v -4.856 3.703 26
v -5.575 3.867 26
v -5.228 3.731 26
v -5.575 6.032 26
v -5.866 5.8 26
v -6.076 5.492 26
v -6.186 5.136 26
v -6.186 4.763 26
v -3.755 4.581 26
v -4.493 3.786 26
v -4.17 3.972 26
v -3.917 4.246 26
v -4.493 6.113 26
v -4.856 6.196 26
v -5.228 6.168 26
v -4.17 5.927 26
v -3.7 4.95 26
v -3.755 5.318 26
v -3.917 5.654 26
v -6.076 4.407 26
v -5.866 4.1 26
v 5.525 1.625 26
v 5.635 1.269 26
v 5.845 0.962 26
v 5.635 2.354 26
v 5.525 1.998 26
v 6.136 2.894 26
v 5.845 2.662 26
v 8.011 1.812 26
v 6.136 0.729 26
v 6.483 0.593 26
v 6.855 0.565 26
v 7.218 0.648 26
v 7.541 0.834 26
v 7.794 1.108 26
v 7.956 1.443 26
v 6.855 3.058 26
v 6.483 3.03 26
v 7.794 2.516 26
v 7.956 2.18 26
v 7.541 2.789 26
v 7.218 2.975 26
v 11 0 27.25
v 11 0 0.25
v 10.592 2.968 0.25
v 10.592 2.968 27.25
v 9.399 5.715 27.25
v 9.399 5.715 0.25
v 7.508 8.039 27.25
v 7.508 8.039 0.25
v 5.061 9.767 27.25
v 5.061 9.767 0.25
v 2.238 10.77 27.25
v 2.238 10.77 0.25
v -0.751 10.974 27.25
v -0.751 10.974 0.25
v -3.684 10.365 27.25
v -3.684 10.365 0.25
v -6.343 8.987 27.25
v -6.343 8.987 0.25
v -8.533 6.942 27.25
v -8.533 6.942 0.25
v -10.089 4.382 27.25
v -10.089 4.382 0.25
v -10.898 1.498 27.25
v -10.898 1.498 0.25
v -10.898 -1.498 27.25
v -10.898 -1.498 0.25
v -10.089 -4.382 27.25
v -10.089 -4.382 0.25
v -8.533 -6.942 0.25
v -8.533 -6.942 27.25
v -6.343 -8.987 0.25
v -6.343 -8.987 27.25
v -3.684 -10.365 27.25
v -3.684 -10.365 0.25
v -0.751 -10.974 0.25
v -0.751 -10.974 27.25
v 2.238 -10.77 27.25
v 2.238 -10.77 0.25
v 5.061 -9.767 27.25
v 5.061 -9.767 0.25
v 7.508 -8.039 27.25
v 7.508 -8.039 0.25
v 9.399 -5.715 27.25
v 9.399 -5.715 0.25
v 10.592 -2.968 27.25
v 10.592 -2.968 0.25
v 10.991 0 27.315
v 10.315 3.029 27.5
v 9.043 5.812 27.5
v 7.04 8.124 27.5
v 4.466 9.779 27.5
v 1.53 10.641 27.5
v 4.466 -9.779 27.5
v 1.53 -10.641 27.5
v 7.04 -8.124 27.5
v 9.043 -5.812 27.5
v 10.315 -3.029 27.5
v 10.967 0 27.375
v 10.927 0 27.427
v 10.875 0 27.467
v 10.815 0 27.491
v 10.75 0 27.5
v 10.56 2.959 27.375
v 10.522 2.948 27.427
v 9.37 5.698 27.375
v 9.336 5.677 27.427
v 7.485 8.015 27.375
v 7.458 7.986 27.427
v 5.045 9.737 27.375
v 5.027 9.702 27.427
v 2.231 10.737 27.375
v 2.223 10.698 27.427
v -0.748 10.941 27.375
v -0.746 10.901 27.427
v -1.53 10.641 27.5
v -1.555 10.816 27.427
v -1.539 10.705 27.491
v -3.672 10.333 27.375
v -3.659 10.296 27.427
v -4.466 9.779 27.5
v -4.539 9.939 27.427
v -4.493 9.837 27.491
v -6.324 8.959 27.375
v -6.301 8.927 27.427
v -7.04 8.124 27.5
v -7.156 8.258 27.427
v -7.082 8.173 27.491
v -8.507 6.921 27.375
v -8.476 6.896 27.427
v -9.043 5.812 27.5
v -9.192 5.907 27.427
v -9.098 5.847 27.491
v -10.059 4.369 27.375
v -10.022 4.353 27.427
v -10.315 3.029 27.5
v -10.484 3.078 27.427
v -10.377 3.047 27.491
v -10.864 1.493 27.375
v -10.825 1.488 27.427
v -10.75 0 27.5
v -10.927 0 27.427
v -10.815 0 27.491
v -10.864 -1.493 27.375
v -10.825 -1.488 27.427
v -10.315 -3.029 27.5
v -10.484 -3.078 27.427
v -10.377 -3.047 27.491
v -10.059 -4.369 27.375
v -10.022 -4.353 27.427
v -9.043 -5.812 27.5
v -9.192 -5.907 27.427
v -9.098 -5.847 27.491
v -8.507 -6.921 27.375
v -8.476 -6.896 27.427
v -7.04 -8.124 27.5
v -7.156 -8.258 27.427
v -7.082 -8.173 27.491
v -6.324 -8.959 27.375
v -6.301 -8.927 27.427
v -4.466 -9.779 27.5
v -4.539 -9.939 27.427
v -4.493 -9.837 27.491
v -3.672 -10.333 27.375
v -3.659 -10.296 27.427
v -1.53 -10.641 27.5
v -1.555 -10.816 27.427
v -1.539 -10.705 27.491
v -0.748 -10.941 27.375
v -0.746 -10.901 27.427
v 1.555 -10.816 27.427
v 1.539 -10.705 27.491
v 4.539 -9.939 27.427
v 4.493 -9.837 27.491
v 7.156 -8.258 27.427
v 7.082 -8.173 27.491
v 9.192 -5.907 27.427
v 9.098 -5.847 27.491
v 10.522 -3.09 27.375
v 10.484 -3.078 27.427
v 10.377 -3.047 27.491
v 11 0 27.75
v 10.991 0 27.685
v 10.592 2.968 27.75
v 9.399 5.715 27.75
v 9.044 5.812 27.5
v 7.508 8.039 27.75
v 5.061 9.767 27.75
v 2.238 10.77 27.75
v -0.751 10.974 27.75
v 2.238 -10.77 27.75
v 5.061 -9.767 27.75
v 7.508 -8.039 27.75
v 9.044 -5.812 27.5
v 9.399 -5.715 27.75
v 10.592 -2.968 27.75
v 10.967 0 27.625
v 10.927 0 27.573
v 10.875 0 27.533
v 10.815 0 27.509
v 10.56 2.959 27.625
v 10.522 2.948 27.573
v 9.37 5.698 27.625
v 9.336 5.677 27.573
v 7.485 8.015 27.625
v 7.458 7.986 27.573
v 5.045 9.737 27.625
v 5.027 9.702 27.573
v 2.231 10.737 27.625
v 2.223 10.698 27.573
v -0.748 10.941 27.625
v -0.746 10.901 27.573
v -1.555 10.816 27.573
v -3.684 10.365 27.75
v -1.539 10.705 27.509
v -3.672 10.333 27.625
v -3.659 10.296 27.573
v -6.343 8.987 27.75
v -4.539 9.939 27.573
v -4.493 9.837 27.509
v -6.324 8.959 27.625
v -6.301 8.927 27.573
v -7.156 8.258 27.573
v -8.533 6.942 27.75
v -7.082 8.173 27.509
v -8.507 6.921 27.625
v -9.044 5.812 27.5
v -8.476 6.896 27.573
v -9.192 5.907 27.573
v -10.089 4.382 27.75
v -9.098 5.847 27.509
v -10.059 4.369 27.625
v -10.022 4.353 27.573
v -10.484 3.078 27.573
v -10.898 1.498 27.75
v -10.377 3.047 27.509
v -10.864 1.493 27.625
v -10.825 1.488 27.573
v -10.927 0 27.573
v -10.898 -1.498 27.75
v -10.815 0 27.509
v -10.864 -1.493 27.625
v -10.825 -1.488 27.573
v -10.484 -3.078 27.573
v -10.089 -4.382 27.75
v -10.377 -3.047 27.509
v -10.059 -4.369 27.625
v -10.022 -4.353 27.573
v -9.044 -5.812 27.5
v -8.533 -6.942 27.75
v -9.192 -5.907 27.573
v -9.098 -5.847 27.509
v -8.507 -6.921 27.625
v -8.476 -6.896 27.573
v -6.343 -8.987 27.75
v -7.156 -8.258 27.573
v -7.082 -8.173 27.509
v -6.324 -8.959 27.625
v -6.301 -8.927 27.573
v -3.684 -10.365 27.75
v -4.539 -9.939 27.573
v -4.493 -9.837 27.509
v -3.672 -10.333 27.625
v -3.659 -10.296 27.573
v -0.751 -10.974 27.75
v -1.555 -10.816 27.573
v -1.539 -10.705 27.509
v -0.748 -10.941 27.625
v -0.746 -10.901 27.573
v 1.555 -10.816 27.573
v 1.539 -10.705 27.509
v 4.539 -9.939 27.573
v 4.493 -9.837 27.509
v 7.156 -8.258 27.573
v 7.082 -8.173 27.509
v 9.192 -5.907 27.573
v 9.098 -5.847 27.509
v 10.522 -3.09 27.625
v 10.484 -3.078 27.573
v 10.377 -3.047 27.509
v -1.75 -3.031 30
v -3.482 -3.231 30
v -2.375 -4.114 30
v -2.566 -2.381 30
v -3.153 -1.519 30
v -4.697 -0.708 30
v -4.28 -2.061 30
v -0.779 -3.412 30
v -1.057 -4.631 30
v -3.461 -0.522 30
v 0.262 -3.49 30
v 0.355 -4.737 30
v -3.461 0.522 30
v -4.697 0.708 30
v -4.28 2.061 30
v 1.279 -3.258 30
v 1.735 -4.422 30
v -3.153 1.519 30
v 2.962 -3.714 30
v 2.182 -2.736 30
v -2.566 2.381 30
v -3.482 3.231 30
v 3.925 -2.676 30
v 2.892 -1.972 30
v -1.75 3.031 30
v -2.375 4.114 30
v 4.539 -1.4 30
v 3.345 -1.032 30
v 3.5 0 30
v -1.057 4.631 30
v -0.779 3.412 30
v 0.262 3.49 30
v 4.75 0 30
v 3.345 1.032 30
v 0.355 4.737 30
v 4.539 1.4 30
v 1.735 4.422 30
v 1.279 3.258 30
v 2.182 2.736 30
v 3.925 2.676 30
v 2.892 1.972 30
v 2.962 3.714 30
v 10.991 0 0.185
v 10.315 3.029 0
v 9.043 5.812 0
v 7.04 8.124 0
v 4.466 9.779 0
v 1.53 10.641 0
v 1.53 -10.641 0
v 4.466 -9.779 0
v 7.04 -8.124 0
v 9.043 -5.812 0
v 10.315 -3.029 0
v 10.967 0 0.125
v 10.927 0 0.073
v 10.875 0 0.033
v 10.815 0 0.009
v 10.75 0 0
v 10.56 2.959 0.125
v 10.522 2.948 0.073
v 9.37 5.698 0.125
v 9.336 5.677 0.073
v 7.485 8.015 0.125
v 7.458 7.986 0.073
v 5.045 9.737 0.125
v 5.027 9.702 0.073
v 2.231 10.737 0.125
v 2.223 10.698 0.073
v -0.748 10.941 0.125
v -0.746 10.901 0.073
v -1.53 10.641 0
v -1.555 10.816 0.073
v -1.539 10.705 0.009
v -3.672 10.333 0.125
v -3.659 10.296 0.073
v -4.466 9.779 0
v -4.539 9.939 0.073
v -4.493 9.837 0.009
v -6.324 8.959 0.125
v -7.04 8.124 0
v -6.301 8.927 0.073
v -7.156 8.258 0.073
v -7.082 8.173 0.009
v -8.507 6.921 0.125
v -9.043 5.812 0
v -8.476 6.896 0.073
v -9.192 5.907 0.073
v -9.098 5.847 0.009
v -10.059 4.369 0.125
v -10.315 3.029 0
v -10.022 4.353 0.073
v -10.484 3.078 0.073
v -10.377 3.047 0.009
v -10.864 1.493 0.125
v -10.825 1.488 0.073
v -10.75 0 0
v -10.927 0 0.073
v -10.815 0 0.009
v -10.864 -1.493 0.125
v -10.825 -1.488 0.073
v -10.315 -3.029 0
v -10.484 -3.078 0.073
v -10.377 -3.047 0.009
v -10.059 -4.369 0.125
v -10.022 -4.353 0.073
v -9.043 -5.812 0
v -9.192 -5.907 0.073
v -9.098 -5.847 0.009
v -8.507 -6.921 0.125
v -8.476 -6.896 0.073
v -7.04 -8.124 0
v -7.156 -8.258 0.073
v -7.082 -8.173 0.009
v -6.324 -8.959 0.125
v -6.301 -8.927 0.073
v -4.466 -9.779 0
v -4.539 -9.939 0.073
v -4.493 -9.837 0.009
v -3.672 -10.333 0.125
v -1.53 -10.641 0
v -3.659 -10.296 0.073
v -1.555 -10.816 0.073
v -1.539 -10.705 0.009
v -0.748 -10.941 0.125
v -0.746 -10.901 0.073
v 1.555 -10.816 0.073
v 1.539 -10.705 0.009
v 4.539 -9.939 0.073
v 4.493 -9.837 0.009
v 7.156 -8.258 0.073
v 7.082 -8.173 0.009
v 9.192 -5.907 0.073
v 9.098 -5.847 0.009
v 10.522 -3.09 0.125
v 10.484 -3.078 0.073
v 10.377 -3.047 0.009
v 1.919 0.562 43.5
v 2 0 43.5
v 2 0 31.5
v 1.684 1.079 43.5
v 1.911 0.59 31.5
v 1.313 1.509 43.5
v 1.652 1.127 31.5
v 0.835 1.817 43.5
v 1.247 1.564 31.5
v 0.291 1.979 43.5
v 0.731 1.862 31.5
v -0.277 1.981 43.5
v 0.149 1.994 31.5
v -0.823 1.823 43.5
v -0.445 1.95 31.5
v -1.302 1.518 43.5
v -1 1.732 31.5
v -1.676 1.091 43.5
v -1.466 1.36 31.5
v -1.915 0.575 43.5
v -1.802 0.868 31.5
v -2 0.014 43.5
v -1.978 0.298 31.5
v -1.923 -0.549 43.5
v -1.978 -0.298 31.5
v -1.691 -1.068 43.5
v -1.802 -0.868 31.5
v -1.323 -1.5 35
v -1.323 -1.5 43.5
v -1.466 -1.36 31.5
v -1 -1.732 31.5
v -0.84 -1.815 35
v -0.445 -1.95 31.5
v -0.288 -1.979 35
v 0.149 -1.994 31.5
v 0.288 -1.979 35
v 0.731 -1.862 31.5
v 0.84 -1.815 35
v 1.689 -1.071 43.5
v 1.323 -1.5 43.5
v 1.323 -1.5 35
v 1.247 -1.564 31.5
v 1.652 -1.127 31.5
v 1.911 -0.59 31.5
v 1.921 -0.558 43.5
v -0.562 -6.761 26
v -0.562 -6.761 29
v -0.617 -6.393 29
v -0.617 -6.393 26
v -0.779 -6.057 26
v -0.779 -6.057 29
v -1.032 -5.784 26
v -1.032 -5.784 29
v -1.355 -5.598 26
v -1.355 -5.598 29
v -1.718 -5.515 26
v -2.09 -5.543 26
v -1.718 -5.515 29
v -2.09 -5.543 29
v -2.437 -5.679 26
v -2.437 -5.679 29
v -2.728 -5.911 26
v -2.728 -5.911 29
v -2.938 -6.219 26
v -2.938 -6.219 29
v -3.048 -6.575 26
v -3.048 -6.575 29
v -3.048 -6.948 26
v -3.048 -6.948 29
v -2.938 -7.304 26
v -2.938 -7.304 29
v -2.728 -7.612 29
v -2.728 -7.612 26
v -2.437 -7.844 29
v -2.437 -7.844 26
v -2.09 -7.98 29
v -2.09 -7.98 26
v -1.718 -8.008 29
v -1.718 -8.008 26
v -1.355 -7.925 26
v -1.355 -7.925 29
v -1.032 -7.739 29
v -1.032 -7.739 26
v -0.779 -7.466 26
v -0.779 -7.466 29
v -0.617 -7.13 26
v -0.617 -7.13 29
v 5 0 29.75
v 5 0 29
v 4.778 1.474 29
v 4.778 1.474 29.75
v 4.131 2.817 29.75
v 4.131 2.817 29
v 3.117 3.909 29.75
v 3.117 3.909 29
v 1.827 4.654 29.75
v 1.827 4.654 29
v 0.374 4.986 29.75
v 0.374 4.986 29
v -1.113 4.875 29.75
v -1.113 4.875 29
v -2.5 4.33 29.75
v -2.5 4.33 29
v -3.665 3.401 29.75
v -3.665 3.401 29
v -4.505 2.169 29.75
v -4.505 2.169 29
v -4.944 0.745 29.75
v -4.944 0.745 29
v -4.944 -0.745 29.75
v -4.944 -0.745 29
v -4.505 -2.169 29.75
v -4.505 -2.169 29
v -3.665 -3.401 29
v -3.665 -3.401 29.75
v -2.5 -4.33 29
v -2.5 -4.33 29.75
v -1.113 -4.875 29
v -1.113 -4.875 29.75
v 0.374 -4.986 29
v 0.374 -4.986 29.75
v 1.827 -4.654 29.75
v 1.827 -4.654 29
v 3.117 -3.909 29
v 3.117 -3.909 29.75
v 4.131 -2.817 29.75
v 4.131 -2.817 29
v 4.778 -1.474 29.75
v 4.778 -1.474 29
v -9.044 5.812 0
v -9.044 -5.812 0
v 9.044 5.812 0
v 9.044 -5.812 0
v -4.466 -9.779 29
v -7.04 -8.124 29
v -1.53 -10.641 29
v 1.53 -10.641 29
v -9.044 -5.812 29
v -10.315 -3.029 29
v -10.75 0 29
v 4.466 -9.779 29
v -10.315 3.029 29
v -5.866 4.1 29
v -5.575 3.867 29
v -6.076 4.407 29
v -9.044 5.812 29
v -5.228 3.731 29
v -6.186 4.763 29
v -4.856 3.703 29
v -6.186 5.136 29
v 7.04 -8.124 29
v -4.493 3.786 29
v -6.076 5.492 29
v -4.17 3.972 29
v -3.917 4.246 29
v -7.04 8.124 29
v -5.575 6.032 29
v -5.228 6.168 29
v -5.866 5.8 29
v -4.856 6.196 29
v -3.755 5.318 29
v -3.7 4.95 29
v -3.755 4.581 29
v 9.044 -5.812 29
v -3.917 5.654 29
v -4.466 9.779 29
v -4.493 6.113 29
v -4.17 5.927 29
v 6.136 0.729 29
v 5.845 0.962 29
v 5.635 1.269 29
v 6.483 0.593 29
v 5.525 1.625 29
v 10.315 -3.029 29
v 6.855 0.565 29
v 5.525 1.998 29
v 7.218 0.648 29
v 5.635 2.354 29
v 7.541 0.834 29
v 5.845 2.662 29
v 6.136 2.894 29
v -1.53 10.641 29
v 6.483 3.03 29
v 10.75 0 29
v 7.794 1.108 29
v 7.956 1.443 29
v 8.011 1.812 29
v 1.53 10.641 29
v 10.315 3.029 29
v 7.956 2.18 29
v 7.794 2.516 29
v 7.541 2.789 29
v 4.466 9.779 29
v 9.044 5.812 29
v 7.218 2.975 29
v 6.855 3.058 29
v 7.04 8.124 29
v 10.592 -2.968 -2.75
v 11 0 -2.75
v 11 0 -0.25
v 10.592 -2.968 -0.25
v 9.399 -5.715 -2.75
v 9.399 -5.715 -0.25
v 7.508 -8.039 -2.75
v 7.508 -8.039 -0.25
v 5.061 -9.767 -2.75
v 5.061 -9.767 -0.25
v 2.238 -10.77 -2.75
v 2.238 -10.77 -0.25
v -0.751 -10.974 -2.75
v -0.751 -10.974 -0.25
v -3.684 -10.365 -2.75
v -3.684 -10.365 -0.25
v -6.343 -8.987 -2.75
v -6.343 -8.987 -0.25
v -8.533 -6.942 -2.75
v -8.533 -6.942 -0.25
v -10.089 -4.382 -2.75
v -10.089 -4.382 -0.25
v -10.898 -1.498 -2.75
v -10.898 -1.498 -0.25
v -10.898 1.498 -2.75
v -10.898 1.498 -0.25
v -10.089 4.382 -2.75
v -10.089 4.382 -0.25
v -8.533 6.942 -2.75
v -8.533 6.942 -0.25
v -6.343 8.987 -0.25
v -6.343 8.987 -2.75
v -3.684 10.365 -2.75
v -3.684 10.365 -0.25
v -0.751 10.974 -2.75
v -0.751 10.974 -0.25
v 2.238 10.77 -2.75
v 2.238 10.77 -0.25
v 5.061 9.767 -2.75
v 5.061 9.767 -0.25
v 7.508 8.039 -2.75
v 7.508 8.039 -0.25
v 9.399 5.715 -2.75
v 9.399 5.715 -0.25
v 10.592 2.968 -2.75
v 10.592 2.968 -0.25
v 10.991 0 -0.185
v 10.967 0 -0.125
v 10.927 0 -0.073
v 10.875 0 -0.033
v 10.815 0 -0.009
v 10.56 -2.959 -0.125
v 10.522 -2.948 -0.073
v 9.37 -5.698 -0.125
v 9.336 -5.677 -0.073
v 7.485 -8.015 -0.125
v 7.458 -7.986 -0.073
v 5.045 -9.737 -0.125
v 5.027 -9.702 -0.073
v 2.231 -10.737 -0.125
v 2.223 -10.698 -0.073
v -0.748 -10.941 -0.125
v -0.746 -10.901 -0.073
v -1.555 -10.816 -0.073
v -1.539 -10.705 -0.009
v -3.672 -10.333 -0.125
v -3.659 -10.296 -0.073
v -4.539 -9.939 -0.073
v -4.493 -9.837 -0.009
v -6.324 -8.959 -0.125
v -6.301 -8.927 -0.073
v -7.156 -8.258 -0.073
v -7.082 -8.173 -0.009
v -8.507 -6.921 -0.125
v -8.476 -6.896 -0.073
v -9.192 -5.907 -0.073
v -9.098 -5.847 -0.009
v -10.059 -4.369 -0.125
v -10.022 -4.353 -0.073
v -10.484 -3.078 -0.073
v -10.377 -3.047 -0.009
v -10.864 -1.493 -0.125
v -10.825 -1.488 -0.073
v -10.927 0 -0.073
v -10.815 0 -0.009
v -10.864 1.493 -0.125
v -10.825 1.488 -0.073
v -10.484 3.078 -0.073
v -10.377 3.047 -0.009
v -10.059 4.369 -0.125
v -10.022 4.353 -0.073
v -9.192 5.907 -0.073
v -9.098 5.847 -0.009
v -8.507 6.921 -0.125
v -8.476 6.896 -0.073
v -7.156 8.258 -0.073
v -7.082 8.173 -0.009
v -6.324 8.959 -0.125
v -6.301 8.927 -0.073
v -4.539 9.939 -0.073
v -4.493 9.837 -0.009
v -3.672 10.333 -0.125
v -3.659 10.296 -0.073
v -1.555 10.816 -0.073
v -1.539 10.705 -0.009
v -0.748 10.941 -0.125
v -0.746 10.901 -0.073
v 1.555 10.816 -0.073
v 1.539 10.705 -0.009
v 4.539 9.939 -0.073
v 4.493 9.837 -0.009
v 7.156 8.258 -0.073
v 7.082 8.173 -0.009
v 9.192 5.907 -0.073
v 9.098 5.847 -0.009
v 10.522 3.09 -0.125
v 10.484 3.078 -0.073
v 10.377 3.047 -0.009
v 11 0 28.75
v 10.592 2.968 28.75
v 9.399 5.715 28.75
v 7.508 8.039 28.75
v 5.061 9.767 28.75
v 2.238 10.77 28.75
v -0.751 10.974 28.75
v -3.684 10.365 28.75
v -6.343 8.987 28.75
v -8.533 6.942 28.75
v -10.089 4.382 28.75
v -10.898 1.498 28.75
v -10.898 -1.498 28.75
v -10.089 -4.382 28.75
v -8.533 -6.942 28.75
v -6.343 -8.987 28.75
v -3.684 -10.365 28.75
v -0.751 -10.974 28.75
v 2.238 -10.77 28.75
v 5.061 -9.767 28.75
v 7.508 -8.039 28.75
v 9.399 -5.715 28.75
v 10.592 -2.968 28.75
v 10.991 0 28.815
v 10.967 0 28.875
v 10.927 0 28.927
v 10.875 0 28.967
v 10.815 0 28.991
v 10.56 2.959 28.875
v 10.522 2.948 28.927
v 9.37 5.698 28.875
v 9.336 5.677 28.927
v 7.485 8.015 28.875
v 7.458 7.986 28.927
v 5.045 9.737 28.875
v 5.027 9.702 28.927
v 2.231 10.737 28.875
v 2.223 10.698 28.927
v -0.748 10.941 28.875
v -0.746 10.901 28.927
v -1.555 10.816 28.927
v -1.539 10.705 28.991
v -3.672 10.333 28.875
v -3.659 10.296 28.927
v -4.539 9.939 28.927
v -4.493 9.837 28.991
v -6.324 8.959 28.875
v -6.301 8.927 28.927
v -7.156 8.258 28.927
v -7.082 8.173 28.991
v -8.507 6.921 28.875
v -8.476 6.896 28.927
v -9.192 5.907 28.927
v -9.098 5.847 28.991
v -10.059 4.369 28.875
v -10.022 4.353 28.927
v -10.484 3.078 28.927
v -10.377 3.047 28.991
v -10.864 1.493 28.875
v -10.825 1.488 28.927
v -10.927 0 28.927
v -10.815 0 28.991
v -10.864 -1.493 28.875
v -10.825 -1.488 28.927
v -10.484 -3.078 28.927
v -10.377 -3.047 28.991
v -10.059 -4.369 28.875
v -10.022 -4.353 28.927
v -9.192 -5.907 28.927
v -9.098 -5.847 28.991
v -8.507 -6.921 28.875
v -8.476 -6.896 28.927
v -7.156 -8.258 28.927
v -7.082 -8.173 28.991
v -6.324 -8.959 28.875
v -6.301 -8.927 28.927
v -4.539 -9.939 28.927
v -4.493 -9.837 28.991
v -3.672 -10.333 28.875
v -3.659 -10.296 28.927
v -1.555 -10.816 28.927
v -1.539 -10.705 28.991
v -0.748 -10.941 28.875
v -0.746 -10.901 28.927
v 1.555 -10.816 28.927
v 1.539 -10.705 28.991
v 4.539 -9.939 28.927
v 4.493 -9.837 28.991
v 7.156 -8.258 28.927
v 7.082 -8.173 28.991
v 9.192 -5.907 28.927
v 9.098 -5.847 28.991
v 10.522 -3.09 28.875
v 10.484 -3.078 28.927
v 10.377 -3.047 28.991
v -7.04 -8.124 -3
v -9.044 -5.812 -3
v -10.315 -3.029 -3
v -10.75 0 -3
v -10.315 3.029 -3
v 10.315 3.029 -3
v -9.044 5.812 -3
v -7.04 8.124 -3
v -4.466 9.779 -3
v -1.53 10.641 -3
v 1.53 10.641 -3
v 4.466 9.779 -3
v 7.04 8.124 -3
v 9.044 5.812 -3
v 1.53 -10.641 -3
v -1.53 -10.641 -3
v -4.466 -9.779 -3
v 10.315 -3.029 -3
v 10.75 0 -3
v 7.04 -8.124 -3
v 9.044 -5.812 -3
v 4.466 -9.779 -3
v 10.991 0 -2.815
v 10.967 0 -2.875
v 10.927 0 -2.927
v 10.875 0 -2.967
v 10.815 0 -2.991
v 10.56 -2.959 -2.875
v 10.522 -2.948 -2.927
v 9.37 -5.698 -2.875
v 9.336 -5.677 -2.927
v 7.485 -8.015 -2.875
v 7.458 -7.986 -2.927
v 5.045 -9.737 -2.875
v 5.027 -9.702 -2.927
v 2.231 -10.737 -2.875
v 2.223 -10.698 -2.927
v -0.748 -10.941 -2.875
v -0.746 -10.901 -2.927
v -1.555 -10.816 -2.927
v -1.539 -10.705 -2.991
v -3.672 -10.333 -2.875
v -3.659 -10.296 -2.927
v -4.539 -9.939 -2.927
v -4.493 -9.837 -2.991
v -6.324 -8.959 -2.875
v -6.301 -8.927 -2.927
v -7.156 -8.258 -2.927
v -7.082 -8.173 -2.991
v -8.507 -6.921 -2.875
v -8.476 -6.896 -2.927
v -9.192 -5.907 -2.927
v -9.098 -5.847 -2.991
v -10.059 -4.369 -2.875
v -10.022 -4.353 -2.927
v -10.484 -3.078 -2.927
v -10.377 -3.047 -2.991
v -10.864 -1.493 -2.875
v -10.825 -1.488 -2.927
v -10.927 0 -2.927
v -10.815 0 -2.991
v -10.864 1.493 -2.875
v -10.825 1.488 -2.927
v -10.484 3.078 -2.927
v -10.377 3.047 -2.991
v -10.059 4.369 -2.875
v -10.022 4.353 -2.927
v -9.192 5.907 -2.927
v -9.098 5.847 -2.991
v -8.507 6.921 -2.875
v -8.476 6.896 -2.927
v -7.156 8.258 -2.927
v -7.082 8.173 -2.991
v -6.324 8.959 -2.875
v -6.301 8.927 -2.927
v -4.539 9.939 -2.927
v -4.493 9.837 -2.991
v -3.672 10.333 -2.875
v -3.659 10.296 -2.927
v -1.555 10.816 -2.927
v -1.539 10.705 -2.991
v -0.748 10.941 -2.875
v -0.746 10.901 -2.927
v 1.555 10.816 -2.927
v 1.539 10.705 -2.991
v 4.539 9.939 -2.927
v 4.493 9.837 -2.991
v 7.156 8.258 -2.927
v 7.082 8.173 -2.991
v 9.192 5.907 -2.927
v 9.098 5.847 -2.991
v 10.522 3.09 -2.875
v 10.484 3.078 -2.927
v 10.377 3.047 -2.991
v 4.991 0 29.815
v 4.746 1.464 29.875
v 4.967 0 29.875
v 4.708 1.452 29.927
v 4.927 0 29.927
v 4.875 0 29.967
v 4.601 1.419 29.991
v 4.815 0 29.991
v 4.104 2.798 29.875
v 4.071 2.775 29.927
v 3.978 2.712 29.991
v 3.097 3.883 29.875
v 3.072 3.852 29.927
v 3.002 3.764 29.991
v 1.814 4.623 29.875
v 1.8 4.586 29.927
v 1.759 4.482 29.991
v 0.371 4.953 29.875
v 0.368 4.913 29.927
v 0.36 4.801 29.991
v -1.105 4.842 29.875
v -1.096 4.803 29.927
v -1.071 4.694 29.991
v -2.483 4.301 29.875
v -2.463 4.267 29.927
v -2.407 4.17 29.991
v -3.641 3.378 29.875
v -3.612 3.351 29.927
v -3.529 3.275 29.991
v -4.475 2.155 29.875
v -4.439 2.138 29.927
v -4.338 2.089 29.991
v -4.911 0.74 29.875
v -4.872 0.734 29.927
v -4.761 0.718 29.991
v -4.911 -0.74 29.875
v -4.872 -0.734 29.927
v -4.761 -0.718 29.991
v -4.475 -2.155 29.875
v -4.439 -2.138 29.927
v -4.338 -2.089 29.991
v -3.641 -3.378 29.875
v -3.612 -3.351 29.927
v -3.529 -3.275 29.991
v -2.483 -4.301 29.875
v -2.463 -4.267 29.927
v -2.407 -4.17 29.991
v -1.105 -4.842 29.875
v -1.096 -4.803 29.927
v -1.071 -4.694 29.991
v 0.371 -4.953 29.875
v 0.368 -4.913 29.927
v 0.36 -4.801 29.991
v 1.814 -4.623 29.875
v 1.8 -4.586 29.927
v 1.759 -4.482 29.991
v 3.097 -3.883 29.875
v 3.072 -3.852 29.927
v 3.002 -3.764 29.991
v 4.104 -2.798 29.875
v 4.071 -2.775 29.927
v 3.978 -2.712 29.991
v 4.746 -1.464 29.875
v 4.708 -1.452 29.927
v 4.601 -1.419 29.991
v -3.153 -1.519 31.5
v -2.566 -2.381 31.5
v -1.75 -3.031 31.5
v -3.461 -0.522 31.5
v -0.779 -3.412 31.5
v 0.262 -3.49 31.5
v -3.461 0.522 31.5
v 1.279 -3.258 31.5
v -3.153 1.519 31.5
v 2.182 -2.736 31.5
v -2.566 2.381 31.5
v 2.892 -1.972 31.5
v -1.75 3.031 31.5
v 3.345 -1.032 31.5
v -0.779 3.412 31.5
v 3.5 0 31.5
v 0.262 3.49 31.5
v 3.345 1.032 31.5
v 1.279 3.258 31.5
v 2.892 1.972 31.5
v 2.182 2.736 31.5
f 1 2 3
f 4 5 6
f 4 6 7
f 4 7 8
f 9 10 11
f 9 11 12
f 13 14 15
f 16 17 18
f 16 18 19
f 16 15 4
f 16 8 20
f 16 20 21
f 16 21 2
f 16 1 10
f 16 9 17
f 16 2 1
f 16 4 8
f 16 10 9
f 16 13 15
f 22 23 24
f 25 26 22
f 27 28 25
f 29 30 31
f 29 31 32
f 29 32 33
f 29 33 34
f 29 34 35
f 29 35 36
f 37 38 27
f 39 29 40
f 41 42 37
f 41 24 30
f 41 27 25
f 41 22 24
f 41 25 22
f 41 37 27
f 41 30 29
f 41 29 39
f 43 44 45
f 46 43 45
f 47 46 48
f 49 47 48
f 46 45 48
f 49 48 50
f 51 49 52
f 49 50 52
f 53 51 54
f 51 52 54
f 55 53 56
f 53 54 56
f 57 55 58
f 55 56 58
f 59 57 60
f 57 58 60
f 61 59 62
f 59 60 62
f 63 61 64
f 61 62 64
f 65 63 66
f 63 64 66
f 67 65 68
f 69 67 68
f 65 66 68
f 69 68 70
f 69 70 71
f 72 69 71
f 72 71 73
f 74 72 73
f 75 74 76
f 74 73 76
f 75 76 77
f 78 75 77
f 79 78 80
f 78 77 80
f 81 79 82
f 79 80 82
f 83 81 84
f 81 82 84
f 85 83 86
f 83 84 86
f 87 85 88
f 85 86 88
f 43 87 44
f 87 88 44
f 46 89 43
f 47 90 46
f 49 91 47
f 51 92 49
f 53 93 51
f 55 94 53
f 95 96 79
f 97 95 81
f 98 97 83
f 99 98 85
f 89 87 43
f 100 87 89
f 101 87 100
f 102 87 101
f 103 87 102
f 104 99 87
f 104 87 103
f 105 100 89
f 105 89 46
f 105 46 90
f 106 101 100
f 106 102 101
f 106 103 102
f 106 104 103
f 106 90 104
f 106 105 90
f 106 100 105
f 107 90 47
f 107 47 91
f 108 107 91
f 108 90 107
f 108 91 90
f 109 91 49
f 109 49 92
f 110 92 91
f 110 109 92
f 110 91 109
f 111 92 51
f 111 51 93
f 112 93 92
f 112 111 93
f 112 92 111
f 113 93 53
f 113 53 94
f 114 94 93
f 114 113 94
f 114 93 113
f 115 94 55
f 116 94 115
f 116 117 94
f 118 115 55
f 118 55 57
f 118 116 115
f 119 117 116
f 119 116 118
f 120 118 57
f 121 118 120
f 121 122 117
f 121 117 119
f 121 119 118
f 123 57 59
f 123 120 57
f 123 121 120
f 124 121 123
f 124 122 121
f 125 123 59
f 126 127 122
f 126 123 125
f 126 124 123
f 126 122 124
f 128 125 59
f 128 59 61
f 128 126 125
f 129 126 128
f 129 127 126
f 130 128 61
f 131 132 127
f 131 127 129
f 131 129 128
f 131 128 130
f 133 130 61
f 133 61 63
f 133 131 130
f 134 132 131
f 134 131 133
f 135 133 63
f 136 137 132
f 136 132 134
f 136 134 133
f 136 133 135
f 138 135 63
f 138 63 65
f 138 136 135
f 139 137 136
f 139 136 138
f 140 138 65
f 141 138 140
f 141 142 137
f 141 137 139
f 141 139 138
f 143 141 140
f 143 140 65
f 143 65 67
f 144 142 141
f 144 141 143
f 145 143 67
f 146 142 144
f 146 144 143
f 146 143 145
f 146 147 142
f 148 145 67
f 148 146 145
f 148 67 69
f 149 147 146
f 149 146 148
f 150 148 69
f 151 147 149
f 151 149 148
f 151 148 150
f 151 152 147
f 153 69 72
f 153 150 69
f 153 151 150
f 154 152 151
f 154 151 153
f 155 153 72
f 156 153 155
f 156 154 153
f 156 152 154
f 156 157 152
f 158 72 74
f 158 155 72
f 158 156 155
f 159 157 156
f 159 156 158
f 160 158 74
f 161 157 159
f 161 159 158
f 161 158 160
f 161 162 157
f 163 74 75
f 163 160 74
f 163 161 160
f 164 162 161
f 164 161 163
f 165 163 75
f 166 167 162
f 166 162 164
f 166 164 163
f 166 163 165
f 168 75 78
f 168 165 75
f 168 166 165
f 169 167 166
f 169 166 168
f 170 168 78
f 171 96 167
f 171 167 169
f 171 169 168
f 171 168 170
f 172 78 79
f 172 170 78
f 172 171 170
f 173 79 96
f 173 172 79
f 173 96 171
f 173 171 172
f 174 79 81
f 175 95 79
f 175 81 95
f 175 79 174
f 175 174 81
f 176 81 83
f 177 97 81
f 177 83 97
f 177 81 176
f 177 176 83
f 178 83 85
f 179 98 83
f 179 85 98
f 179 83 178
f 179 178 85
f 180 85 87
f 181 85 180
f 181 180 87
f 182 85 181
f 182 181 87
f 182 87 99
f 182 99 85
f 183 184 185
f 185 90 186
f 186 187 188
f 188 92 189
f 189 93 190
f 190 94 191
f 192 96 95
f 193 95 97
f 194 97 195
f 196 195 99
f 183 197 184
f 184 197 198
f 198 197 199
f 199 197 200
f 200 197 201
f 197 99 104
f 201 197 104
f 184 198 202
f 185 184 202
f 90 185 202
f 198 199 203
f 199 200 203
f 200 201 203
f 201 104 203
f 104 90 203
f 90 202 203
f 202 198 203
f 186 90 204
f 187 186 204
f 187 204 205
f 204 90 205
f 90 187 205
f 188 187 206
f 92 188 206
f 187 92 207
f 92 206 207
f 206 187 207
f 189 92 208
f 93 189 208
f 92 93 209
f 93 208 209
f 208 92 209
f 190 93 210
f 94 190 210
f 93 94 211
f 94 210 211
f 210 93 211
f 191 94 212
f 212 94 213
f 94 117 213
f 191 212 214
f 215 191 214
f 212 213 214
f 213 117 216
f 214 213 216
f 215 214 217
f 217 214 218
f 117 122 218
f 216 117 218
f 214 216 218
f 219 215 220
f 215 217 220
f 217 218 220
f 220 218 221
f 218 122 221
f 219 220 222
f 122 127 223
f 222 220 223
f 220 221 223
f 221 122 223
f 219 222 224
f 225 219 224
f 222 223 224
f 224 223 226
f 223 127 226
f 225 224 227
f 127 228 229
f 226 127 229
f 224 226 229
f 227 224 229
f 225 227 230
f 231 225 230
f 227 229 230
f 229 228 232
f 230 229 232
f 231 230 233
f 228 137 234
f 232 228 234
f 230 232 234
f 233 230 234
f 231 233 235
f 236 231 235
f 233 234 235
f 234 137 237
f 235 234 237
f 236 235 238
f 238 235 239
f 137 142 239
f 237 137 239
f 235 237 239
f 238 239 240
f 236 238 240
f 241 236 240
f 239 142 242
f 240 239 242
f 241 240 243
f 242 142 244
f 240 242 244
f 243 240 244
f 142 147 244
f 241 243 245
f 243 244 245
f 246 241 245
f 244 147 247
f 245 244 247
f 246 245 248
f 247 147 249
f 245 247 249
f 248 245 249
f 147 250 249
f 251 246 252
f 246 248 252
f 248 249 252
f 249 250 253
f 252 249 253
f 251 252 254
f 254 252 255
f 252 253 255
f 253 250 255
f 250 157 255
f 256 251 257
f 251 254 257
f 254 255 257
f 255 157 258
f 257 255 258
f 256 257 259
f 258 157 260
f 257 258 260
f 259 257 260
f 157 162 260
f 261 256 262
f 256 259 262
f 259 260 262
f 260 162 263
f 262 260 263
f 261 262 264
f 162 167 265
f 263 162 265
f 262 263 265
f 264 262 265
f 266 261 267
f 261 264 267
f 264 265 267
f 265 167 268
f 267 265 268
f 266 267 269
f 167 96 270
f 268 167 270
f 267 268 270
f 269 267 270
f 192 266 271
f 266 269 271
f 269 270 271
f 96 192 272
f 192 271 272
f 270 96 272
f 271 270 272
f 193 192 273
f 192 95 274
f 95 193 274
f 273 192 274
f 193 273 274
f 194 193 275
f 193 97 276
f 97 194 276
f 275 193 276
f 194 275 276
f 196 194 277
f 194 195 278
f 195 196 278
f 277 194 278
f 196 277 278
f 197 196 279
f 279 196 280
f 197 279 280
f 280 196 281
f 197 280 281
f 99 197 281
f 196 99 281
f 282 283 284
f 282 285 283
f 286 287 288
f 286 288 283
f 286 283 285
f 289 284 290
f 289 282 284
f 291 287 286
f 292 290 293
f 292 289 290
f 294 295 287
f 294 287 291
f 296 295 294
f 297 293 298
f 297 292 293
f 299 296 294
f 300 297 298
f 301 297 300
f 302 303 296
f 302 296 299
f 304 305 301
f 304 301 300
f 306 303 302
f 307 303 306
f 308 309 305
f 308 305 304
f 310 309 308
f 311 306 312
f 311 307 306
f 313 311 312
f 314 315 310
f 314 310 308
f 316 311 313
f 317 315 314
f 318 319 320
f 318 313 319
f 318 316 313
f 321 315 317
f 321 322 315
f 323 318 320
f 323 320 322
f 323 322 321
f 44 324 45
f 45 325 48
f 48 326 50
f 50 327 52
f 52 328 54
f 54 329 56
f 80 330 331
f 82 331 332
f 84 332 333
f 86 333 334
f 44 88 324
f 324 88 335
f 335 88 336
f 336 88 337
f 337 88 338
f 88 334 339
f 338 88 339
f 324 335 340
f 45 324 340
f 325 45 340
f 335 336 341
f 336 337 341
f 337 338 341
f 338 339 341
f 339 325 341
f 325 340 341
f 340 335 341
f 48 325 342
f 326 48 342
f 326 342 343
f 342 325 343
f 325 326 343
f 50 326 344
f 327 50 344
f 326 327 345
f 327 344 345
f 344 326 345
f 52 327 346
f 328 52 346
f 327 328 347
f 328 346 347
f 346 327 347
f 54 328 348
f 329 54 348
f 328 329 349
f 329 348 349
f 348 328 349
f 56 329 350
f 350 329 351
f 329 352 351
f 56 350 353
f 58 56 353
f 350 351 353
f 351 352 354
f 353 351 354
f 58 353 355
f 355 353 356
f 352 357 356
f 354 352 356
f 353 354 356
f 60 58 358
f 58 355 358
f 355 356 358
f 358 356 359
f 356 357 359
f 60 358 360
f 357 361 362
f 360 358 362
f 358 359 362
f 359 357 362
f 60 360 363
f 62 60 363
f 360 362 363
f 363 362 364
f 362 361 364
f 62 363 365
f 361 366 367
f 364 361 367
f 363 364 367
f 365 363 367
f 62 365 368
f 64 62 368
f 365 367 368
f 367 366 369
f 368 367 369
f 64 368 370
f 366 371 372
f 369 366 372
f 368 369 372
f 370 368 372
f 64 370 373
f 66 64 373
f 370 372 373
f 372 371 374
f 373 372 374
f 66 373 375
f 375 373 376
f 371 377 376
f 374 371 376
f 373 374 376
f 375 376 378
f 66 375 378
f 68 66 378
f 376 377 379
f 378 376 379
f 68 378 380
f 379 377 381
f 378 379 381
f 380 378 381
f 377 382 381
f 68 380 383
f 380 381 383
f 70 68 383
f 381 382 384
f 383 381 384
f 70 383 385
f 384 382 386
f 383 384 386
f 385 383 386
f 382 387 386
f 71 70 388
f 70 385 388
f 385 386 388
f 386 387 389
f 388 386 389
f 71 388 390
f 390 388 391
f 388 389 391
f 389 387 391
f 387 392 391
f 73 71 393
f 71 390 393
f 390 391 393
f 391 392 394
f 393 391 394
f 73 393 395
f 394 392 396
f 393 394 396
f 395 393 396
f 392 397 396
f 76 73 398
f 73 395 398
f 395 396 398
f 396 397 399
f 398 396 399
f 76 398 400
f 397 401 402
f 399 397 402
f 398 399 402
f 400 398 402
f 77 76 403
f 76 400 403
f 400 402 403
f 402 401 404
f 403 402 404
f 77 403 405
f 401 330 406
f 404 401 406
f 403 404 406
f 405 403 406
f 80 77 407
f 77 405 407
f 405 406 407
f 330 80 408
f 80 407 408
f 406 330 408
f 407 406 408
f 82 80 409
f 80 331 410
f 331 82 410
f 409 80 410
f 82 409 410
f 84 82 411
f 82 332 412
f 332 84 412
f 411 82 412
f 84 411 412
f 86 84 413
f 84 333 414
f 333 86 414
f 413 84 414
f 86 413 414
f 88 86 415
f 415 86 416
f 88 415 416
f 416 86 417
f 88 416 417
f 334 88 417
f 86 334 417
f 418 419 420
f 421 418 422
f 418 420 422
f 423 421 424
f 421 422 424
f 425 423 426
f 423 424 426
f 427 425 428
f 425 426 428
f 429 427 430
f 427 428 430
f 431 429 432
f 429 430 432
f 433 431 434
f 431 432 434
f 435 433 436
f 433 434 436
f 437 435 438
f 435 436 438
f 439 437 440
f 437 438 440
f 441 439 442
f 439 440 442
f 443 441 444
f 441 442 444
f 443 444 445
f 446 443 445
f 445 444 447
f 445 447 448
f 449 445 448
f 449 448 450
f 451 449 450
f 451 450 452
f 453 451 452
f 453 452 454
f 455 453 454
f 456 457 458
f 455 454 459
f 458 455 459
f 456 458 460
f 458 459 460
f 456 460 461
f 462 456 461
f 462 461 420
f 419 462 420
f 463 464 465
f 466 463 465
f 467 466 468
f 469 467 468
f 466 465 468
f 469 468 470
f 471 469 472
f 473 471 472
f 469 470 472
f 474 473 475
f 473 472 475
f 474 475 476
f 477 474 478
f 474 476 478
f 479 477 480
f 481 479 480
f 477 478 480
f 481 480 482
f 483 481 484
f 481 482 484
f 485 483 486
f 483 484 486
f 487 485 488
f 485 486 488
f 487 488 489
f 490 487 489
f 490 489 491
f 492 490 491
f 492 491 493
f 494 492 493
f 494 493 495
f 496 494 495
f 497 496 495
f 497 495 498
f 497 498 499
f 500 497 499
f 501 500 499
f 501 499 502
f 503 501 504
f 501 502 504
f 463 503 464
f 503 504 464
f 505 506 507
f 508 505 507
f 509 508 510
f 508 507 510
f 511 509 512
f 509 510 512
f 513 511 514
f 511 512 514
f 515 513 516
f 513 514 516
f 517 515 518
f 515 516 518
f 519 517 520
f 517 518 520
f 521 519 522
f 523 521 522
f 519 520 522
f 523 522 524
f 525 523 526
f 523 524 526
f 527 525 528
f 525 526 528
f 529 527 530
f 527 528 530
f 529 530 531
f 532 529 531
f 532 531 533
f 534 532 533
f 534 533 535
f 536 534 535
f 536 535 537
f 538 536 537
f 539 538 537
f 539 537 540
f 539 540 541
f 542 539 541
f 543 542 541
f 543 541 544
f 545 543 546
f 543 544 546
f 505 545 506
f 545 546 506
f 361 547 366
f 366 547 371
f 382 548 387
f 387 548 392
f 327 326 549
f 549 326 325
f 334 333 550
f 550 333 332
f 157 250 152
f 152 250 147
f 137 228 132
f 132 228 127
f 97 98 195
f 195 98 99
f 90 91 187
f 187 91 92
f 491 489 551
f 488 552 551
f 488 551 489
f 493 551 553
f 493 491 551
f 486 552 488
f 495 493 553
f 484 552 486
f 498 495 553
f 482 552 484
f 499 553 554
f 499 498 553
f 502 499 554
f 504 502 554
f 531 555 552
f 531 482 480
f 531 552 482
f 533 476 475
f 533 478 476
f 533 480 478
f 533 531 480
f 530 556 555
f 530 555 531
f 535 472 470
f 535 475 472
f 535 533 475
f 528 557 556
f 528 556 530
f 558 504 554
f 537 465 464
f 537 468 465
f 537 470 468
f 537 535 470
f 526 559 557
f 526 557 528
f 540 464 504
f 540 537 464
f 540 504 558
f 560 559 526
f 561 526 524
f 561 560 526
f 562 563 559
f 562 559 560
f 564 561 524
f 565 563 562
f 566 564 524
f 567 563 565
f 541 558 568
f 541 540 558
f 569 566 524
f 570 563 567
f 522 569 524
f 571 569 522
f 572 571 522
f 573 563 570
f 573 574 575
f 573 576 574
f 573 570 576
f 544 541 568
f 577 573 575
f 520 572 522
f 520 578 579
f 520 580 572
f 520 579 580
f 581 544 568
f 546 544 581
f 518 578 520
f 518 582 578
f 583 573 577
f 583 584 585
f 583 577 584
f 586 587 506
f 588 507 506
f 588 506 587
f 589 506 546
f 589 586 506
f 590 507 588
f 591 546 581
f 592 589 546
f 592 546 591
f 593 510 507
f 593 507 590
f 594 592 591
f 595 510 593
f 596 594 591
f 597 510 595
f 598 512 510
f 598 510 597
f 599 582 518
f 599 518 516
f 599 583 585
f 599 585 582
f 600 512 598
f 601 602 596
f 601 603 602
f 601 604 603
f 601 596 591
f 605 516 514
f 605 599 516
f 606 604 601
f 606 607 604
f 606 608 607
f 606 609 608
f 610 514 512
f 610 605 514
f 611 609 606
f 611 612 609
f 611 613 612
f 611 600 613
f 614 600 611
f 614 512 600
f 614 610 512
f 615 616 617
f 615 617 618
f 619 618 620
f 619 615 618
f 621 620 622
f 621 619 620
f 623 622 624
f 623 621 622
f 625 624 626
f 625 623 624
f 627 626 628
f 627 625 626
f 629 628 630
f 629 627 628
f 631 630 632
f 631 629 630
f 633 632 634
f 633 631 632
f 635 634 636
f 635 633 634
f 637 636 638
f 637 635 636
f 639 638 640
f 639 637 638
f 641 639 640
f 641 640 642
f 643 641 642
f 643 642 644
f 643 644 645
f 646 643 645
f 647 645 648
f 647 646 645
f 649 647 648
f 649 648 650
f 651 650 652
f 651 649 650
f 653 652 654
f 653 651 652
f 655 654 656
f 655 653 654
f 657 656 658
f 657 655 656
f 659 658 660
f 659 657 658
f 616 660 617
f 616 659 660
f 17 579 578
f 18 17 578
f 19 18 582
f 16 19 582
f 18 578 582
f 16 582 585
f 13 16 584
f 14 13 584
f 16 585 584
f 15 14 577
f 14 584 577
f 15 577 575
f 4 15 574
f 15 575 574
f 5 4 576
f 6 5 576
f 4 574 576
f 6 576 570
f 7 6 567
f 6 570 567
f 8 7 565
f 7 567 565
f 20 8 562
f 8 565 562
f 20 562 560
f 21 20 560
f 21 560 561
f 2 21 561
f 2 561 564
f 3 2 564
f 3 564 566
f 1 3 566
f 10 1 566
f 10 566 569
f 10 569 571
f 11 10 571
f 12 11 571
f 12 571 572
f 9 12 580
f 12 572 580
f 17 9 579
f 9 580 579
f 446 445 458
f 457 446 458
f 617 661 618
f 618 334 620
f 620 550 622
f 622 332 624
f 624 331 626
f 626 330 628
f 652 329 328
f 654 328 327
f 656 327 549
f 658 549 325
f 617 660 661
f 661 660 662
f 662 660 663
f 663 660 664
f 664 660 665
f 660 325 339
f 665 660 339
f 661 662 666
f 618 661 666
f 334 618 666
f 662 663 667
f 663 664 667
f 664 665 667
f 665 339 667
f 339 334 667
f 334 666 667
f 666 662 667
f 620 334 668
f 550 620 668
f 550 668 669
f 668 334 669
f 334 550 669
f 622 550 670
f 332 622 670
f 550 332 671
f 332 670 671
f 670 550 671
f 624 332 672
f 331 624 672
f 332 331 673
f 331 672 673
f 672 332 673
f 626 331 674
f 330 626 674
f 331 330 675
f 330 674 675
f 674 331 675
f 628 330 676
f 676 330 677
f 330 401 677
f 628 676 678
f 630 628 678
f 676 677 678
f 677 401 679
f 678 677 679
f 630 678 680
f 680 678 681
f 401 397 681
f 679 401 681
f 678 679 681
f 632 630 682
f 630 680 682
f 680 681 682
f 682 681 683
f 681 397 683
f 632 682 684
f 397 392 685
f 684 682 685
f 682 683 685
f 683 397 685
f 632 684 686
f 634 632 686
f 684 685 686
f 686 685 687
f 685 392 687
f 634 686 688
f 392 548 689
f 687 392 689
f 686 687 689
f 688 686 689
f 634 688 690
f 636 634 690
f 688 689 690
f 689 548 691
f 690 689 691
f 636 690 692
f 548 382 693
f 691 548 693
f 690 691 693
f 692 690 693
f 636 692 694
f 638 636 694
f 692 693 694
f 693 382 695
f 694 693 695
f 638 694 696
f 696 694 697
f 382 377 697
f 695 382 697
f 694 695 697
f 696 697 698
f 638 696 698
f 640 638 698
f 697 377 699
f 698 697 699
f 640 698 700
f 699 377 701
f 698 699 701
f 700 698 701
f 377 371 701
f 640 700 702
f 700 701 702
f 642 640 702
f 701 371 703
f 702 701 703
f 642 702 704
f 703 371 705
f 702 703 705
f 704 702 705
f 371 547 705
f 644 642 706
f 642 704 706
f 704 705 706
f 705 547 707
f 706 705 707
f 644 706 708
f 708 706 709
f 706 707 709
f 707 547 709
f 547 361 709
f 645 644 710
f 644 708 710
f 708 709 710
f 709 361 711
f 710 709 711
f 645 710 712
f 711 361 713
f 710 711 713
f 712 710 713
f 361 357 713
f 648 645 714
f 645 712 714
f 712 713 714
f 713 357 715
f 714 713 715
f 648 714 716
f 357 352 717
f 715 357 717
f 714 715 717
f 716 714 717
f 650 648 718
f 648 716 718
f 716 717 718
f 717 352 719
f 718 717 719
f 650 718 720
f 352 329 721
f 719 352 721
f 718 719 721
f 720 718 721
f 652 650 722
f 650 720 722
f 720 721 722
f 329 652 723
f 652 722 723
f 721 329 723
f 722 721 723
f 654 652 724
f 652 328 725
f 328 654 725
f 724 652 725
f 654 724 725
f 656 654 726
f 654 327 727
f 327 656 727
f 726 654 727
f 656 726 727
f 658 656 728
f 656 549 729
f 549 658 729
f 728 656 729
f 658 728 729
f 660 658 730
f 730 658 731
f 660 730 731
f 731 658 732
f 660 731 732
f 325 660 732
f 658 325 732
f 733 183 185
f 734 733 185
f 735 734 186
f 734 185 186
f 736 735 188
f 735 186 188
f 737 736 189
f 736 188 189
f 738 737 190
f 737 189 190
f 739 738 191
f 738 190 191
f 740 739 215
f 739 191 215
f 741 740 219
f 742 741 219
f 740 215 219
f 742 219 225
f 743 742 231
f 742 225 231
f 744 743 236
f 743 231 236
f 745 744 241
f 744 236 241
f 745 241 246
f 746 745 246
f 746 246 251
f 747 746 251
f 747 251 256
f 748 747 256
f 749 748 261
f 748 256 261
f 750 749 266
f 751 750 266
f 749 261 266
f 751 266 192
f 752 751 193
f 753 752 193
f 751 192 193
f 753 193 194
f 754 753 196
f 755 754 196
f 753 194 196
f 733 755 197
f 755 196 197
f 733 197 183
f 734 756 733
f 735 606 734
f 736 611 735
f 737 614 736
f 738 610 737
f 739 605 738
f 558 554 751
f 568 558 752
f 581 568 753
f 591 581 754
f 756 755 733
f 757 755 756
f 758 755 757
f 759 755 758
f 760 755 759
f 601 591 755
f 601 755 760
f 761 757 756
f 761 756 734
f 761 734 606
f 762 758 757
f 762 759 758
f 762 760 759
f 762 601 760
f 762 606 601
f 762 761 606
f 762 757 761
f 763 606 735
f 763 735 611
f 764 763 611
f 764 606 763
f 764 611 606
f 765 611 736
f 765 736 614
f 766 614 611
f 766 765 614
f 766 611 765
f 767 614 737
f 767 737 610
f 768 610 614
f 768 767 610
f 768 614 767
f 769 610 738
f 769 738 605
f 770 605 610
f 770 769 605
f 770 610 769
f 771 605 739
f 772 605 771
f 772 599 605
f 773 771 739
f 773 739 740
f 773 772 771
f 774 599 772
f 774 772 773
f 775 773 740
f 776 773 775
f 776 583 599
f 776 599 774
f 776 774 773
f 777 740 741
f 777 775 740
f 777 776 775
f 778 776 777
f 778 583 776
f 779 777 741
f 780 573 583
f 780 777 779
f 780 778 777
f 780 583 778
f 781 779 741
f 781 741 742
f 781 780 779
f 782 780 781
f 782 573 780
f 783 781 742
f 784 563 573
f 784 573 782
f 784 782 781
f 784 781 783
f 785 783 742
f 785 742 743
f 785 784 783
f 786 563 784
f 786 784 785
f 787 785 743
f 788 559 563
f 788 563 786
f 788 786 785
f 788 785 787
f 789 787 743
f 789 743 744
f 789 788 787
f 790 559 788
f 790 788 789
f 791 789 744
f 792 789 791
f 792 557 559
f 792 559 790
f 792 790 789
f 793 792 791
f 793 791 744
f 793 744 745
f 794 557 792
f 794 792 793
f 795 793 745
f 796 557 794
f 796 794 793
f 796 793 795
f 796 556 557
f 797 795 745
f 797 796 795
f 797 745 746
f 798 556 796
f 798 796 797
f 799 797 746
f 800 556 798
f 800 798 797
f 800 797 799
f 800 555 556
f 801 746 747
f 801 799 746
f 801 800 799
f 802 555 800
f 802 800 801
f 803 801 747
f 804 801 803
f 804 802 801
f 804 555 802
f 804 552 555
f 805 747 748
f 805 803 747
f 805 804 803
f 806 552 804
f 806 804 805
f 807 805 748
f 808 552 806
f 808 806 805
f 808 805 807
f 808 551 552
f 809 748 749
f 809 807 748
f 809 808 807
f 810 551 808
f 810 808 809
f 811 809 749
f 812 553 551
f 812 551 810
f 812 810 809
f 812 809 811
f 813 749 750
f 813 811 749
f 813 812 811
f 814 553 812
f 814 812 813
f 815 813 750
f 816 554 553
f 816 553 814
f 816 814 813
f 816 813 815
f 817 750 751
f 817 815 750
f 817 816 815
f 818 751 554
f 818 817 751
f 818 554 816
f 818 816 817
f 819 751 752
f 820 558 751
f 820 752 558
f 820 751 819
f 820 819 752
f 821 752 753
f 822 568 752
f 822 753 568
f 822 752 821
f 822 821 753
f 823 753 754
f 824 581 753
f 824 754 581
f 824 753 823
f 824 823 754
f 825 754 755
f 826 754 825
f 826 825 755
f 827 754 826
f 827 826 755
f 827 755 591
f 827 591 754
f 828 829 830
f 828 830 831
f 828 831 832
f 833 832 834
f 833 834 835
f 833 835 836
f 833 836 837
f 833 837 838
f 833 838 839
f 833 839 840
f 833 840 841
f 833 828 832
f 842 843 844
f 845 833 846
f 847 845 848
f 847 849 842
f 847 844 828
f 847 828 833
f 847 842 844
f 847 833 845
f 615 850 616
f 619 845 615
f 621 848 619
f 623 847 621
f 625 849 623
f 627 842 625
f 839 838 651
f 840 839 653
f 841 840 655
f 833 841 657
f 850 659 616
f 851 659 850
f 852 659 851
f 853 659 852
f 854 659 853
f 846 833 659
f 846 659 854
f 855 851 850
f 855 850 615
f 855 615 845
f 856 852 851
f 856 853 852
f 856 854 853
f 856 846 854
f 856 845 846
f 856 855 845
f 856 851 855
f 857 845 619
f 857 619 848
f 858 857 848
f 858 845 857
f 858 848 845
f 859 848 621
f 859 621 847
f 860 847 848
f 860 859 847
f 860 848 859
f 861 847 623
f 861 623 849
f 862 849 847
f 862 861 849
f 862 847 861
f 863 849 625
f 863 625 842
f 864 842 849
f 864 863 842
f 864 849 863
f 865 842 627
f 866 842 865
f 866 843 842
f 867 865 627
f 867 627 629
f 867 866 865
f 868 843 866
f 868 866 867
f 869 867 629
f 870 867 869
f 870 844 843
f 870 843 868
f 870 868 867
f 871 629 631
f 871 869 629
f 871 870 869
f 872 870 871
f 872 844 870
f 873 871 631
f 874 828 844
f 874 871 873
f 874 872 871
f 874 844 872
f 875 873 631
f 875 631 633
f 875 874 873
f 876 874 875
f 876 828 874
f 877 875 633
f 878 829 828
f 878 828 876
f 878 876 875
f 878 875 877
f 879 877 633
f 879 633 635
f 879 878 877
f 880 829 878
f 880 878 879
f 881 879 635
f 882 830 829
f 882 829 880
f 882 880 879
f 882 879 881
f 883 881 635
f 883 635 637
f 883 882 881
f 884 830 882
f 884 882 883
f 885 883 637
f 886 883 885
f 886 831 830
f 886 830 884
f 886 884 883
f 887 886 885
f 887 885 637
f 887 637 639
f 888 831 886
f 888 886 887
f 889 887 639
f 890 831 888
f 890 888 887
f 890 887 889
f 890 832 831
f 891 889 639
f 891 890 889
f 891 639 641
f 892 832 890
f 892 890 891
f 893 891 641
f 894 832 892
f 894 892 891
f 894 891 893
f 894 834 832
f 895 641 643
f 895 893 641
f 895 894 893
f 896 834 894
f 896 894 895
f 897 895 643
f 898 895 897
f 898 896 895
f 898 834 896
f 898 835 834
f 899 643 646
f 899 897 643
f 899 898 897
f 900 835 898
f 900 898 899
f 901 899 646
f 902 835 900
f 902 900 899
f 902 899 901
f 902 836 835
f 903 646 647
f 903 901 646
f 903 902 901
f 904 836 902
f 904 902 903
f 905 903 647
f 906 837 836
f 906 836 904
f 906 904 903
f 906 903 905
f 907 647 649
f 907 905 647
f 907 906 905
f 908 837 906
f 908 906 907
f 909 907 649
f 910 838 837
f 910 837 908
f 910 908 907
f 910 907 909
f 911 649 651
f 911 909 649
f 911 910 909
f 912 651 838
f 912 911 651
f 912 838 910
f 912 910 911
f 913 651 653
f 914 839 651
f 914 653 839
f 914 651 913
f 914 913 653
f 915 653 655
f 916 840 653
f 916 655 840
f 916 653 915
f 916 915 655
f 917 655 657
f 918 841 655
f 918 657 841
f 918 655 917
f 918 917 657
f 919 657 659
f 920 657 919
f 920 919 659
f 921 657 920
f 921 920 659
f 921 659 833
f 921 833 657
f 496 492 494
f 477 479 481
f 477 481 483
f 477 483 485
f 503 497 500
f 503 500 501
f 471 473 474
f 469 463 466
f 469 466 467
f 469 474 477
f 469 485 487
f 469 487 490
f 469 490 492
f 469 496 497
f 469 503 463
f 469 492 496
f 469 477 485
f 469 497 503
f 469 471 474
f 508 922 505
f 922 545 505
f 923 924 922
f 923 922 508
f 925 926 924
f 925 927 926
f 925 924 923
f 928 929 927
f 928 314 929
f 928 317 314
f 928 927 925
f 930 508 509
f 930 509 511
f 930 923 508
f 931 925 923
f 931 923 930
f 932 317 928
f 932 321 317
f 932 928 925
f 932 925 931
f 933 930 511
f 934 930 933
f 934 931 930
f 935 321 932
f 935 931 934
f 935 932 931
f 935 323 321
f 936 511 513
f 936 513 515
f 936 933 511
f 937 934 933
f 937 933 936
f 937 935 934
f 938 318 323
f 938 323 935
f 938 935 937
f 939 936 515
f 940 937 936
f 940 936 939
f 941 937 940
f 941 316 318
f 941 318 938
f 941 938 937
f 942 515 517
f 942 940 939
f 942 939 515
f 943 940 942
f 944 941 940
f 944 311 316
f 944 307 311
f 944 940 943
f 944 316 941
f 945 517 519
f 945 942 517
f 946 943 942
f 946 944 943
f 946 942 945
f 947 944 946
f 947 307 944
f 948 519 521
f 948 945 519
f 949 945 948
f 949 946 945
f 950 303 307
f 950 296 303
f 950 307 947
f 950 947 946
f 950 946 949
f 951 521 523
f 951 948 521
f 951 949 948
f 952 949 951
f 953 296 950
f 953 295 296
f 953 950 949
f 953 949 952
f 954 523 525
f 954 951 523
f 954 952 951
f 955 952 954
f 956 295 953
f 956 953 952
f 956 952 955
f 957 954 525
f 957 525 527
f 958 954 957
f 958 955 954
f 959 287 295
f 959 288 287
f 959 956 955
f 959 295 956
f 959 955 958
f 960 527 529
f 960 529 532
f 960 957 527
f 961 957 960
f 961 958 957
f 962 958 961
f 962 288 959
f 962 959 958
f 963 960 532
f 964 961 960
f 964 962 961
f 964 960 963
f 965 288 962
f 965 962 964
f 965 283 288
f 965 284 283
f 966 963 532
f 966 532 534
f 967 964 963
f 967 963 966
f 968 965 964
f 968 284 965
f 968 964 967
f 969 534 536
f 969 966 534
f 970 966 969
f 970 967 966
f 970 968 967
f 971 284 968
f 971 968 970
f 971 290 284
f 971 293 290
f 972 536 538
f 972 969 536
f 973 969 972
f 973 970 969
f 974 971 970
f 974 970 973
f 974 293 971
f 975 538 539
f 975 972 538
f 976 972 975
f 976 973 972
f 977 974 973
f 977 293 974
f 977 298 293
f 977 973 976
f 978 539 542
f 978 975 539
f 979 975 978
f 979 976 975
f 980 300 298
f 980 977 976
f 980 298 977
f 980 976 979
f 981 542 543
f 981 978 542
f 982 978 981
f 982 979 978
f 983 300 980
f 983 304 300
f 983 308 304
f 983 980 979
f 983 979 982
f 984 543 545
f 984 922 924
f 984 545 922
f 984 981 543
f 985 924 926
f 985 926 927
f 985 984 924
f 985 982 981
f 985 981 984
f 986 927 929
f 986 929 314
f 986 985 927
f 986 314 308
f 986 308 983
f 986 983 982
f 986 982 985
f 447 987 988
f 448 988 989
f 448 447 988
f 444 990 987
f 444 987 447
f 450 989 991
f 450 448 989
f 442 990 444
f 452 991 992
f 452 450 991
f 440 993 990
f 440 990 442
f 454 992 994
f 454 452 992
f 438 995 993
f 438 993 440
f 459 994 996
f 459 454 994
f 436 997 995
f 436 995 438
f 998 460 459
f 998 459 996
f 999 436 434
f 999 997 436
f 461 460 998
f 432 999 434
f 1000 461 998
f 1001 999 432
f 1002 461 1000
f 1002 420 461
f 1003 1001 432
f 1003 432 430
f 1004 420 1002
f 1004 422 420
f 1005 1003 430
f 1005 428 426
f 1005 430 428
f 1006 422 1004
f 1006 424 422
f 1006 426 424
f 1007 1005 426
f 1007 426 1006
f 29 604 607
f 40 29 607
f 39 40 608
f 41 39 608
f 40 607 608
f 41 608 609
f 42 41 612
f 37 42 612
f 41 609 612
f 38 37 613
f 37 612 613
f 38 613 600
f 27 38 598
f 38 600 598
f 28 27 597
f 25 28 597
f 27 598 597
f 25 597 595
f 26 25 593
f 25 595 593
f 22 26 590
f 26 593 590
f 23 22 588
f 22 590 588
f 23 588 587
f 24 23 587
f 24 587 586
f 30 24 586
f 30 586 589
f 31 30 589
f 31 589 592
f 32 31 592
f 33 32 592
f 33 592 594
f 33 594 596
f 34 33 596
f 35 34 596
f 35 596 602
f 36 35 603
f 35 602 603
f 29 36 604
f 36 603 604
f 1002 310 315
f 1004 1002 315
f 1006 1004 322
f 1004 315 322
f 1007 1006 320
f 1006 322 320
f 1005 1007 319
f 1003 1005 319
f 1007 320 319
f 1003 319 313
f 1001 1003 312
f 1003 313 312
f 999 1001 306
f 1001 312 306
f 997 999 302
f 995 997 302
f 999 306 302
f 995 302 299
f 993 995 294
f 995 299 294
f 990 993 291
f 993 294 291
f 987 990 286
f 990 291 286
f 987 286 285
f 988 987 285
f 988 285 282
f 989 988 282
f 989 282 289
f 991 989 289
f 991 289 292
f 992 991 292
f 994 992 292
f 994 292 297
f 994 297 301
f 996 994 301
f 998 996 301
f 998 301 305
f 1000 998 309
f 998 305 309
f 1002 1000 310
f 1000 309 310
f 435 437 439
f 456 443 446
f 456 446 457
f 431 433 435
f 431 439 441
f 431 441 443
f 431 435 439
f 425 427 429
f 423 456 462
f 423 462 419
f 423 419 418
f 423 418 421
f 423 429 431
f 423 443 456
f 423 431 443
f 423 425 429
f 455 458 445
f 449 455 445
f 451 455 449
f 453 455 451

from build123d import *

# Parameters (mm, degrees)
ESQUISSE1_R             = 11
BOSS_EXTRU_1_DEPTH      = 27.5
CONG_1_R                = 0.25
BOSS_EXTRU_5_START      = 3
ESQUISSE4_R             = 11
BOSS_EXTRU_5_DEPTH      = 3
CONG_2_R                = 0.25
ESQUISSE5_R             = 11
BOSS_EXTRU_6_DEPTH      = 1.5
CONG_3_R                = 0.25
ESQUISSE6_R             = 5
BOSS_EXTRU_7_DEPTH      = 1
CONG_4_R                = 0.25
ESQUISSE7_R             = 3.5
BOSS_EXTRU_8_DEPTH      = 1.5
ESQUISSE8_R             = 2
BOSS_EXTRU_9_DEPTH      = 12
ENL_V_START             = -8.5
ENL_V_MAT_EXTRU_1_DEPTH = 8.5
ESQUISSE10_R            = 1.25
ENL_V_MAT_EXTRU_2_DEPTH = 3


with BuildPart() as part:
    # Esquisse1 → Boss.-Extru.1 (new body)
    with BuildSketch(Plane.XY):
        Circle(ESQUISSE1_R)
    extrude(amount=BOSS_EXTRU_1_DEPTH)

    # Congé1
    cong_1_edges = [part.edges().sort_by_distance(p)[0] for p in [
        (-11, 0, 0),
        (-11, 0, 27.5),
    ]]
    fillet(cong_1_edges, radius=CONG_1_R)

    # Esquisse4 → Boss.-Extru.5 (add)
    with BuildSketch(Plane(origin=(0, 0, 0), x_dir=(-1, 0, 0), z_dir=(0, 0, -1)).offset(BOSS_EXTRU_5_START)):
        with Locations(Location((0, 0, 0), (0, 0, 180))):
            Circle(ESQUISSE4_R)
    extrude(amount=-BOSS_EXTRU_5_DEPTH)

    # Congé2
    cong_2_edges = [part.edges().sort_by_distance(p)[0] for p in [
        (-11, 0, 0),
        (-11, 0, -3),
    ]]
    fillet(cong_2_edges, radius=CONG_2_R - 0.0001)  # a hair under: the kernel refuses the full size

    # Esquisse5 → Boss.-Extru.6 (add)
    with BuildSketch(Plane.XY.offset(27.5)):
        Circle(ESQUISSE5_R)
    extrude(amount=BOSS_EXTRU_6_DEPTH)

    # Congé3
    cong_3_edges = [part.edges().sort_by_distance(p)[0] for p in [
        (-11, 0, 27.5),
        (-11, 0, 29),
    ]]
    fillet(cong_3_edges, radius=CONG_3_R - 0.0001)  # a hair under: the kernel refuses the full size

    # Esquisse6 → Boss.-Extru.7 (add)
    with BuildSketch(Plane.XY.offset(29)):
        Circle(ESQUISSE6_R)
    extrude(amount=BOSS_EXTRU_7_DEPTH)

    # Congé4
    cong_4_edges = [part.edges().sort_by_distance(p)[0] for p in [
        (-5, 0, 30),
    ]]
    fillet(cong_4_edges, radius=CONG_4_R)

    # Esquisse7 → Boss.-Extru.8 (add)
    with BuildSketch(Plane.XY.offset(30)):
        Circle(ESQUISSE7_R)
    extrude(amount=BOSS_EXTRU_8_DEPTH)

    # Esquisse8 → Boss.-Extru.9 (add)
    with BuildSketch(Plane.XY.offset(31.5)):
        Circle(ESQUISSE8_R)
    extrude(amount=BOSS_EXTRU_9_DEPTH)

    # Esquisse9 → Enlèv. mat.-Extru.1 (cut)
    with BuildSketch(Plane.XY.offset(43.5).offset(ENL_V_START)):
        with BuildLine():
            Line((-1.322875656, -1.5), (1.322875656, -1.5))
            ThreePointArc((1.322875656, -1.5), (0, -2), (-1.322875656, -1.5))
        make_face()
    extrude(amount=ENL_V_MAT_EXTRU_1_DEPTH, mode=Mode.SUBTRACT)

    # Esquisse10 → Enlèv. mat.-Extru.2 (cut)
    with BuildSketch(Plane.XY.offset(29)):
        with Locations((6.761480784, 1.811733316)):
            Circle(ESQUISSE10_R)
        with Locations((-1.811733316, -6.761480784)):
            Circle(ESQUISSE10_R)
        with Locations((-4.949747468, 4.949747468)):
            Circle(ESQUISSE10_R)
    extrude(amount=-ENL_V_MAT_EXTRU_2_DEPTH, mode=Mode.SUBTRACT)


solid = part.part
